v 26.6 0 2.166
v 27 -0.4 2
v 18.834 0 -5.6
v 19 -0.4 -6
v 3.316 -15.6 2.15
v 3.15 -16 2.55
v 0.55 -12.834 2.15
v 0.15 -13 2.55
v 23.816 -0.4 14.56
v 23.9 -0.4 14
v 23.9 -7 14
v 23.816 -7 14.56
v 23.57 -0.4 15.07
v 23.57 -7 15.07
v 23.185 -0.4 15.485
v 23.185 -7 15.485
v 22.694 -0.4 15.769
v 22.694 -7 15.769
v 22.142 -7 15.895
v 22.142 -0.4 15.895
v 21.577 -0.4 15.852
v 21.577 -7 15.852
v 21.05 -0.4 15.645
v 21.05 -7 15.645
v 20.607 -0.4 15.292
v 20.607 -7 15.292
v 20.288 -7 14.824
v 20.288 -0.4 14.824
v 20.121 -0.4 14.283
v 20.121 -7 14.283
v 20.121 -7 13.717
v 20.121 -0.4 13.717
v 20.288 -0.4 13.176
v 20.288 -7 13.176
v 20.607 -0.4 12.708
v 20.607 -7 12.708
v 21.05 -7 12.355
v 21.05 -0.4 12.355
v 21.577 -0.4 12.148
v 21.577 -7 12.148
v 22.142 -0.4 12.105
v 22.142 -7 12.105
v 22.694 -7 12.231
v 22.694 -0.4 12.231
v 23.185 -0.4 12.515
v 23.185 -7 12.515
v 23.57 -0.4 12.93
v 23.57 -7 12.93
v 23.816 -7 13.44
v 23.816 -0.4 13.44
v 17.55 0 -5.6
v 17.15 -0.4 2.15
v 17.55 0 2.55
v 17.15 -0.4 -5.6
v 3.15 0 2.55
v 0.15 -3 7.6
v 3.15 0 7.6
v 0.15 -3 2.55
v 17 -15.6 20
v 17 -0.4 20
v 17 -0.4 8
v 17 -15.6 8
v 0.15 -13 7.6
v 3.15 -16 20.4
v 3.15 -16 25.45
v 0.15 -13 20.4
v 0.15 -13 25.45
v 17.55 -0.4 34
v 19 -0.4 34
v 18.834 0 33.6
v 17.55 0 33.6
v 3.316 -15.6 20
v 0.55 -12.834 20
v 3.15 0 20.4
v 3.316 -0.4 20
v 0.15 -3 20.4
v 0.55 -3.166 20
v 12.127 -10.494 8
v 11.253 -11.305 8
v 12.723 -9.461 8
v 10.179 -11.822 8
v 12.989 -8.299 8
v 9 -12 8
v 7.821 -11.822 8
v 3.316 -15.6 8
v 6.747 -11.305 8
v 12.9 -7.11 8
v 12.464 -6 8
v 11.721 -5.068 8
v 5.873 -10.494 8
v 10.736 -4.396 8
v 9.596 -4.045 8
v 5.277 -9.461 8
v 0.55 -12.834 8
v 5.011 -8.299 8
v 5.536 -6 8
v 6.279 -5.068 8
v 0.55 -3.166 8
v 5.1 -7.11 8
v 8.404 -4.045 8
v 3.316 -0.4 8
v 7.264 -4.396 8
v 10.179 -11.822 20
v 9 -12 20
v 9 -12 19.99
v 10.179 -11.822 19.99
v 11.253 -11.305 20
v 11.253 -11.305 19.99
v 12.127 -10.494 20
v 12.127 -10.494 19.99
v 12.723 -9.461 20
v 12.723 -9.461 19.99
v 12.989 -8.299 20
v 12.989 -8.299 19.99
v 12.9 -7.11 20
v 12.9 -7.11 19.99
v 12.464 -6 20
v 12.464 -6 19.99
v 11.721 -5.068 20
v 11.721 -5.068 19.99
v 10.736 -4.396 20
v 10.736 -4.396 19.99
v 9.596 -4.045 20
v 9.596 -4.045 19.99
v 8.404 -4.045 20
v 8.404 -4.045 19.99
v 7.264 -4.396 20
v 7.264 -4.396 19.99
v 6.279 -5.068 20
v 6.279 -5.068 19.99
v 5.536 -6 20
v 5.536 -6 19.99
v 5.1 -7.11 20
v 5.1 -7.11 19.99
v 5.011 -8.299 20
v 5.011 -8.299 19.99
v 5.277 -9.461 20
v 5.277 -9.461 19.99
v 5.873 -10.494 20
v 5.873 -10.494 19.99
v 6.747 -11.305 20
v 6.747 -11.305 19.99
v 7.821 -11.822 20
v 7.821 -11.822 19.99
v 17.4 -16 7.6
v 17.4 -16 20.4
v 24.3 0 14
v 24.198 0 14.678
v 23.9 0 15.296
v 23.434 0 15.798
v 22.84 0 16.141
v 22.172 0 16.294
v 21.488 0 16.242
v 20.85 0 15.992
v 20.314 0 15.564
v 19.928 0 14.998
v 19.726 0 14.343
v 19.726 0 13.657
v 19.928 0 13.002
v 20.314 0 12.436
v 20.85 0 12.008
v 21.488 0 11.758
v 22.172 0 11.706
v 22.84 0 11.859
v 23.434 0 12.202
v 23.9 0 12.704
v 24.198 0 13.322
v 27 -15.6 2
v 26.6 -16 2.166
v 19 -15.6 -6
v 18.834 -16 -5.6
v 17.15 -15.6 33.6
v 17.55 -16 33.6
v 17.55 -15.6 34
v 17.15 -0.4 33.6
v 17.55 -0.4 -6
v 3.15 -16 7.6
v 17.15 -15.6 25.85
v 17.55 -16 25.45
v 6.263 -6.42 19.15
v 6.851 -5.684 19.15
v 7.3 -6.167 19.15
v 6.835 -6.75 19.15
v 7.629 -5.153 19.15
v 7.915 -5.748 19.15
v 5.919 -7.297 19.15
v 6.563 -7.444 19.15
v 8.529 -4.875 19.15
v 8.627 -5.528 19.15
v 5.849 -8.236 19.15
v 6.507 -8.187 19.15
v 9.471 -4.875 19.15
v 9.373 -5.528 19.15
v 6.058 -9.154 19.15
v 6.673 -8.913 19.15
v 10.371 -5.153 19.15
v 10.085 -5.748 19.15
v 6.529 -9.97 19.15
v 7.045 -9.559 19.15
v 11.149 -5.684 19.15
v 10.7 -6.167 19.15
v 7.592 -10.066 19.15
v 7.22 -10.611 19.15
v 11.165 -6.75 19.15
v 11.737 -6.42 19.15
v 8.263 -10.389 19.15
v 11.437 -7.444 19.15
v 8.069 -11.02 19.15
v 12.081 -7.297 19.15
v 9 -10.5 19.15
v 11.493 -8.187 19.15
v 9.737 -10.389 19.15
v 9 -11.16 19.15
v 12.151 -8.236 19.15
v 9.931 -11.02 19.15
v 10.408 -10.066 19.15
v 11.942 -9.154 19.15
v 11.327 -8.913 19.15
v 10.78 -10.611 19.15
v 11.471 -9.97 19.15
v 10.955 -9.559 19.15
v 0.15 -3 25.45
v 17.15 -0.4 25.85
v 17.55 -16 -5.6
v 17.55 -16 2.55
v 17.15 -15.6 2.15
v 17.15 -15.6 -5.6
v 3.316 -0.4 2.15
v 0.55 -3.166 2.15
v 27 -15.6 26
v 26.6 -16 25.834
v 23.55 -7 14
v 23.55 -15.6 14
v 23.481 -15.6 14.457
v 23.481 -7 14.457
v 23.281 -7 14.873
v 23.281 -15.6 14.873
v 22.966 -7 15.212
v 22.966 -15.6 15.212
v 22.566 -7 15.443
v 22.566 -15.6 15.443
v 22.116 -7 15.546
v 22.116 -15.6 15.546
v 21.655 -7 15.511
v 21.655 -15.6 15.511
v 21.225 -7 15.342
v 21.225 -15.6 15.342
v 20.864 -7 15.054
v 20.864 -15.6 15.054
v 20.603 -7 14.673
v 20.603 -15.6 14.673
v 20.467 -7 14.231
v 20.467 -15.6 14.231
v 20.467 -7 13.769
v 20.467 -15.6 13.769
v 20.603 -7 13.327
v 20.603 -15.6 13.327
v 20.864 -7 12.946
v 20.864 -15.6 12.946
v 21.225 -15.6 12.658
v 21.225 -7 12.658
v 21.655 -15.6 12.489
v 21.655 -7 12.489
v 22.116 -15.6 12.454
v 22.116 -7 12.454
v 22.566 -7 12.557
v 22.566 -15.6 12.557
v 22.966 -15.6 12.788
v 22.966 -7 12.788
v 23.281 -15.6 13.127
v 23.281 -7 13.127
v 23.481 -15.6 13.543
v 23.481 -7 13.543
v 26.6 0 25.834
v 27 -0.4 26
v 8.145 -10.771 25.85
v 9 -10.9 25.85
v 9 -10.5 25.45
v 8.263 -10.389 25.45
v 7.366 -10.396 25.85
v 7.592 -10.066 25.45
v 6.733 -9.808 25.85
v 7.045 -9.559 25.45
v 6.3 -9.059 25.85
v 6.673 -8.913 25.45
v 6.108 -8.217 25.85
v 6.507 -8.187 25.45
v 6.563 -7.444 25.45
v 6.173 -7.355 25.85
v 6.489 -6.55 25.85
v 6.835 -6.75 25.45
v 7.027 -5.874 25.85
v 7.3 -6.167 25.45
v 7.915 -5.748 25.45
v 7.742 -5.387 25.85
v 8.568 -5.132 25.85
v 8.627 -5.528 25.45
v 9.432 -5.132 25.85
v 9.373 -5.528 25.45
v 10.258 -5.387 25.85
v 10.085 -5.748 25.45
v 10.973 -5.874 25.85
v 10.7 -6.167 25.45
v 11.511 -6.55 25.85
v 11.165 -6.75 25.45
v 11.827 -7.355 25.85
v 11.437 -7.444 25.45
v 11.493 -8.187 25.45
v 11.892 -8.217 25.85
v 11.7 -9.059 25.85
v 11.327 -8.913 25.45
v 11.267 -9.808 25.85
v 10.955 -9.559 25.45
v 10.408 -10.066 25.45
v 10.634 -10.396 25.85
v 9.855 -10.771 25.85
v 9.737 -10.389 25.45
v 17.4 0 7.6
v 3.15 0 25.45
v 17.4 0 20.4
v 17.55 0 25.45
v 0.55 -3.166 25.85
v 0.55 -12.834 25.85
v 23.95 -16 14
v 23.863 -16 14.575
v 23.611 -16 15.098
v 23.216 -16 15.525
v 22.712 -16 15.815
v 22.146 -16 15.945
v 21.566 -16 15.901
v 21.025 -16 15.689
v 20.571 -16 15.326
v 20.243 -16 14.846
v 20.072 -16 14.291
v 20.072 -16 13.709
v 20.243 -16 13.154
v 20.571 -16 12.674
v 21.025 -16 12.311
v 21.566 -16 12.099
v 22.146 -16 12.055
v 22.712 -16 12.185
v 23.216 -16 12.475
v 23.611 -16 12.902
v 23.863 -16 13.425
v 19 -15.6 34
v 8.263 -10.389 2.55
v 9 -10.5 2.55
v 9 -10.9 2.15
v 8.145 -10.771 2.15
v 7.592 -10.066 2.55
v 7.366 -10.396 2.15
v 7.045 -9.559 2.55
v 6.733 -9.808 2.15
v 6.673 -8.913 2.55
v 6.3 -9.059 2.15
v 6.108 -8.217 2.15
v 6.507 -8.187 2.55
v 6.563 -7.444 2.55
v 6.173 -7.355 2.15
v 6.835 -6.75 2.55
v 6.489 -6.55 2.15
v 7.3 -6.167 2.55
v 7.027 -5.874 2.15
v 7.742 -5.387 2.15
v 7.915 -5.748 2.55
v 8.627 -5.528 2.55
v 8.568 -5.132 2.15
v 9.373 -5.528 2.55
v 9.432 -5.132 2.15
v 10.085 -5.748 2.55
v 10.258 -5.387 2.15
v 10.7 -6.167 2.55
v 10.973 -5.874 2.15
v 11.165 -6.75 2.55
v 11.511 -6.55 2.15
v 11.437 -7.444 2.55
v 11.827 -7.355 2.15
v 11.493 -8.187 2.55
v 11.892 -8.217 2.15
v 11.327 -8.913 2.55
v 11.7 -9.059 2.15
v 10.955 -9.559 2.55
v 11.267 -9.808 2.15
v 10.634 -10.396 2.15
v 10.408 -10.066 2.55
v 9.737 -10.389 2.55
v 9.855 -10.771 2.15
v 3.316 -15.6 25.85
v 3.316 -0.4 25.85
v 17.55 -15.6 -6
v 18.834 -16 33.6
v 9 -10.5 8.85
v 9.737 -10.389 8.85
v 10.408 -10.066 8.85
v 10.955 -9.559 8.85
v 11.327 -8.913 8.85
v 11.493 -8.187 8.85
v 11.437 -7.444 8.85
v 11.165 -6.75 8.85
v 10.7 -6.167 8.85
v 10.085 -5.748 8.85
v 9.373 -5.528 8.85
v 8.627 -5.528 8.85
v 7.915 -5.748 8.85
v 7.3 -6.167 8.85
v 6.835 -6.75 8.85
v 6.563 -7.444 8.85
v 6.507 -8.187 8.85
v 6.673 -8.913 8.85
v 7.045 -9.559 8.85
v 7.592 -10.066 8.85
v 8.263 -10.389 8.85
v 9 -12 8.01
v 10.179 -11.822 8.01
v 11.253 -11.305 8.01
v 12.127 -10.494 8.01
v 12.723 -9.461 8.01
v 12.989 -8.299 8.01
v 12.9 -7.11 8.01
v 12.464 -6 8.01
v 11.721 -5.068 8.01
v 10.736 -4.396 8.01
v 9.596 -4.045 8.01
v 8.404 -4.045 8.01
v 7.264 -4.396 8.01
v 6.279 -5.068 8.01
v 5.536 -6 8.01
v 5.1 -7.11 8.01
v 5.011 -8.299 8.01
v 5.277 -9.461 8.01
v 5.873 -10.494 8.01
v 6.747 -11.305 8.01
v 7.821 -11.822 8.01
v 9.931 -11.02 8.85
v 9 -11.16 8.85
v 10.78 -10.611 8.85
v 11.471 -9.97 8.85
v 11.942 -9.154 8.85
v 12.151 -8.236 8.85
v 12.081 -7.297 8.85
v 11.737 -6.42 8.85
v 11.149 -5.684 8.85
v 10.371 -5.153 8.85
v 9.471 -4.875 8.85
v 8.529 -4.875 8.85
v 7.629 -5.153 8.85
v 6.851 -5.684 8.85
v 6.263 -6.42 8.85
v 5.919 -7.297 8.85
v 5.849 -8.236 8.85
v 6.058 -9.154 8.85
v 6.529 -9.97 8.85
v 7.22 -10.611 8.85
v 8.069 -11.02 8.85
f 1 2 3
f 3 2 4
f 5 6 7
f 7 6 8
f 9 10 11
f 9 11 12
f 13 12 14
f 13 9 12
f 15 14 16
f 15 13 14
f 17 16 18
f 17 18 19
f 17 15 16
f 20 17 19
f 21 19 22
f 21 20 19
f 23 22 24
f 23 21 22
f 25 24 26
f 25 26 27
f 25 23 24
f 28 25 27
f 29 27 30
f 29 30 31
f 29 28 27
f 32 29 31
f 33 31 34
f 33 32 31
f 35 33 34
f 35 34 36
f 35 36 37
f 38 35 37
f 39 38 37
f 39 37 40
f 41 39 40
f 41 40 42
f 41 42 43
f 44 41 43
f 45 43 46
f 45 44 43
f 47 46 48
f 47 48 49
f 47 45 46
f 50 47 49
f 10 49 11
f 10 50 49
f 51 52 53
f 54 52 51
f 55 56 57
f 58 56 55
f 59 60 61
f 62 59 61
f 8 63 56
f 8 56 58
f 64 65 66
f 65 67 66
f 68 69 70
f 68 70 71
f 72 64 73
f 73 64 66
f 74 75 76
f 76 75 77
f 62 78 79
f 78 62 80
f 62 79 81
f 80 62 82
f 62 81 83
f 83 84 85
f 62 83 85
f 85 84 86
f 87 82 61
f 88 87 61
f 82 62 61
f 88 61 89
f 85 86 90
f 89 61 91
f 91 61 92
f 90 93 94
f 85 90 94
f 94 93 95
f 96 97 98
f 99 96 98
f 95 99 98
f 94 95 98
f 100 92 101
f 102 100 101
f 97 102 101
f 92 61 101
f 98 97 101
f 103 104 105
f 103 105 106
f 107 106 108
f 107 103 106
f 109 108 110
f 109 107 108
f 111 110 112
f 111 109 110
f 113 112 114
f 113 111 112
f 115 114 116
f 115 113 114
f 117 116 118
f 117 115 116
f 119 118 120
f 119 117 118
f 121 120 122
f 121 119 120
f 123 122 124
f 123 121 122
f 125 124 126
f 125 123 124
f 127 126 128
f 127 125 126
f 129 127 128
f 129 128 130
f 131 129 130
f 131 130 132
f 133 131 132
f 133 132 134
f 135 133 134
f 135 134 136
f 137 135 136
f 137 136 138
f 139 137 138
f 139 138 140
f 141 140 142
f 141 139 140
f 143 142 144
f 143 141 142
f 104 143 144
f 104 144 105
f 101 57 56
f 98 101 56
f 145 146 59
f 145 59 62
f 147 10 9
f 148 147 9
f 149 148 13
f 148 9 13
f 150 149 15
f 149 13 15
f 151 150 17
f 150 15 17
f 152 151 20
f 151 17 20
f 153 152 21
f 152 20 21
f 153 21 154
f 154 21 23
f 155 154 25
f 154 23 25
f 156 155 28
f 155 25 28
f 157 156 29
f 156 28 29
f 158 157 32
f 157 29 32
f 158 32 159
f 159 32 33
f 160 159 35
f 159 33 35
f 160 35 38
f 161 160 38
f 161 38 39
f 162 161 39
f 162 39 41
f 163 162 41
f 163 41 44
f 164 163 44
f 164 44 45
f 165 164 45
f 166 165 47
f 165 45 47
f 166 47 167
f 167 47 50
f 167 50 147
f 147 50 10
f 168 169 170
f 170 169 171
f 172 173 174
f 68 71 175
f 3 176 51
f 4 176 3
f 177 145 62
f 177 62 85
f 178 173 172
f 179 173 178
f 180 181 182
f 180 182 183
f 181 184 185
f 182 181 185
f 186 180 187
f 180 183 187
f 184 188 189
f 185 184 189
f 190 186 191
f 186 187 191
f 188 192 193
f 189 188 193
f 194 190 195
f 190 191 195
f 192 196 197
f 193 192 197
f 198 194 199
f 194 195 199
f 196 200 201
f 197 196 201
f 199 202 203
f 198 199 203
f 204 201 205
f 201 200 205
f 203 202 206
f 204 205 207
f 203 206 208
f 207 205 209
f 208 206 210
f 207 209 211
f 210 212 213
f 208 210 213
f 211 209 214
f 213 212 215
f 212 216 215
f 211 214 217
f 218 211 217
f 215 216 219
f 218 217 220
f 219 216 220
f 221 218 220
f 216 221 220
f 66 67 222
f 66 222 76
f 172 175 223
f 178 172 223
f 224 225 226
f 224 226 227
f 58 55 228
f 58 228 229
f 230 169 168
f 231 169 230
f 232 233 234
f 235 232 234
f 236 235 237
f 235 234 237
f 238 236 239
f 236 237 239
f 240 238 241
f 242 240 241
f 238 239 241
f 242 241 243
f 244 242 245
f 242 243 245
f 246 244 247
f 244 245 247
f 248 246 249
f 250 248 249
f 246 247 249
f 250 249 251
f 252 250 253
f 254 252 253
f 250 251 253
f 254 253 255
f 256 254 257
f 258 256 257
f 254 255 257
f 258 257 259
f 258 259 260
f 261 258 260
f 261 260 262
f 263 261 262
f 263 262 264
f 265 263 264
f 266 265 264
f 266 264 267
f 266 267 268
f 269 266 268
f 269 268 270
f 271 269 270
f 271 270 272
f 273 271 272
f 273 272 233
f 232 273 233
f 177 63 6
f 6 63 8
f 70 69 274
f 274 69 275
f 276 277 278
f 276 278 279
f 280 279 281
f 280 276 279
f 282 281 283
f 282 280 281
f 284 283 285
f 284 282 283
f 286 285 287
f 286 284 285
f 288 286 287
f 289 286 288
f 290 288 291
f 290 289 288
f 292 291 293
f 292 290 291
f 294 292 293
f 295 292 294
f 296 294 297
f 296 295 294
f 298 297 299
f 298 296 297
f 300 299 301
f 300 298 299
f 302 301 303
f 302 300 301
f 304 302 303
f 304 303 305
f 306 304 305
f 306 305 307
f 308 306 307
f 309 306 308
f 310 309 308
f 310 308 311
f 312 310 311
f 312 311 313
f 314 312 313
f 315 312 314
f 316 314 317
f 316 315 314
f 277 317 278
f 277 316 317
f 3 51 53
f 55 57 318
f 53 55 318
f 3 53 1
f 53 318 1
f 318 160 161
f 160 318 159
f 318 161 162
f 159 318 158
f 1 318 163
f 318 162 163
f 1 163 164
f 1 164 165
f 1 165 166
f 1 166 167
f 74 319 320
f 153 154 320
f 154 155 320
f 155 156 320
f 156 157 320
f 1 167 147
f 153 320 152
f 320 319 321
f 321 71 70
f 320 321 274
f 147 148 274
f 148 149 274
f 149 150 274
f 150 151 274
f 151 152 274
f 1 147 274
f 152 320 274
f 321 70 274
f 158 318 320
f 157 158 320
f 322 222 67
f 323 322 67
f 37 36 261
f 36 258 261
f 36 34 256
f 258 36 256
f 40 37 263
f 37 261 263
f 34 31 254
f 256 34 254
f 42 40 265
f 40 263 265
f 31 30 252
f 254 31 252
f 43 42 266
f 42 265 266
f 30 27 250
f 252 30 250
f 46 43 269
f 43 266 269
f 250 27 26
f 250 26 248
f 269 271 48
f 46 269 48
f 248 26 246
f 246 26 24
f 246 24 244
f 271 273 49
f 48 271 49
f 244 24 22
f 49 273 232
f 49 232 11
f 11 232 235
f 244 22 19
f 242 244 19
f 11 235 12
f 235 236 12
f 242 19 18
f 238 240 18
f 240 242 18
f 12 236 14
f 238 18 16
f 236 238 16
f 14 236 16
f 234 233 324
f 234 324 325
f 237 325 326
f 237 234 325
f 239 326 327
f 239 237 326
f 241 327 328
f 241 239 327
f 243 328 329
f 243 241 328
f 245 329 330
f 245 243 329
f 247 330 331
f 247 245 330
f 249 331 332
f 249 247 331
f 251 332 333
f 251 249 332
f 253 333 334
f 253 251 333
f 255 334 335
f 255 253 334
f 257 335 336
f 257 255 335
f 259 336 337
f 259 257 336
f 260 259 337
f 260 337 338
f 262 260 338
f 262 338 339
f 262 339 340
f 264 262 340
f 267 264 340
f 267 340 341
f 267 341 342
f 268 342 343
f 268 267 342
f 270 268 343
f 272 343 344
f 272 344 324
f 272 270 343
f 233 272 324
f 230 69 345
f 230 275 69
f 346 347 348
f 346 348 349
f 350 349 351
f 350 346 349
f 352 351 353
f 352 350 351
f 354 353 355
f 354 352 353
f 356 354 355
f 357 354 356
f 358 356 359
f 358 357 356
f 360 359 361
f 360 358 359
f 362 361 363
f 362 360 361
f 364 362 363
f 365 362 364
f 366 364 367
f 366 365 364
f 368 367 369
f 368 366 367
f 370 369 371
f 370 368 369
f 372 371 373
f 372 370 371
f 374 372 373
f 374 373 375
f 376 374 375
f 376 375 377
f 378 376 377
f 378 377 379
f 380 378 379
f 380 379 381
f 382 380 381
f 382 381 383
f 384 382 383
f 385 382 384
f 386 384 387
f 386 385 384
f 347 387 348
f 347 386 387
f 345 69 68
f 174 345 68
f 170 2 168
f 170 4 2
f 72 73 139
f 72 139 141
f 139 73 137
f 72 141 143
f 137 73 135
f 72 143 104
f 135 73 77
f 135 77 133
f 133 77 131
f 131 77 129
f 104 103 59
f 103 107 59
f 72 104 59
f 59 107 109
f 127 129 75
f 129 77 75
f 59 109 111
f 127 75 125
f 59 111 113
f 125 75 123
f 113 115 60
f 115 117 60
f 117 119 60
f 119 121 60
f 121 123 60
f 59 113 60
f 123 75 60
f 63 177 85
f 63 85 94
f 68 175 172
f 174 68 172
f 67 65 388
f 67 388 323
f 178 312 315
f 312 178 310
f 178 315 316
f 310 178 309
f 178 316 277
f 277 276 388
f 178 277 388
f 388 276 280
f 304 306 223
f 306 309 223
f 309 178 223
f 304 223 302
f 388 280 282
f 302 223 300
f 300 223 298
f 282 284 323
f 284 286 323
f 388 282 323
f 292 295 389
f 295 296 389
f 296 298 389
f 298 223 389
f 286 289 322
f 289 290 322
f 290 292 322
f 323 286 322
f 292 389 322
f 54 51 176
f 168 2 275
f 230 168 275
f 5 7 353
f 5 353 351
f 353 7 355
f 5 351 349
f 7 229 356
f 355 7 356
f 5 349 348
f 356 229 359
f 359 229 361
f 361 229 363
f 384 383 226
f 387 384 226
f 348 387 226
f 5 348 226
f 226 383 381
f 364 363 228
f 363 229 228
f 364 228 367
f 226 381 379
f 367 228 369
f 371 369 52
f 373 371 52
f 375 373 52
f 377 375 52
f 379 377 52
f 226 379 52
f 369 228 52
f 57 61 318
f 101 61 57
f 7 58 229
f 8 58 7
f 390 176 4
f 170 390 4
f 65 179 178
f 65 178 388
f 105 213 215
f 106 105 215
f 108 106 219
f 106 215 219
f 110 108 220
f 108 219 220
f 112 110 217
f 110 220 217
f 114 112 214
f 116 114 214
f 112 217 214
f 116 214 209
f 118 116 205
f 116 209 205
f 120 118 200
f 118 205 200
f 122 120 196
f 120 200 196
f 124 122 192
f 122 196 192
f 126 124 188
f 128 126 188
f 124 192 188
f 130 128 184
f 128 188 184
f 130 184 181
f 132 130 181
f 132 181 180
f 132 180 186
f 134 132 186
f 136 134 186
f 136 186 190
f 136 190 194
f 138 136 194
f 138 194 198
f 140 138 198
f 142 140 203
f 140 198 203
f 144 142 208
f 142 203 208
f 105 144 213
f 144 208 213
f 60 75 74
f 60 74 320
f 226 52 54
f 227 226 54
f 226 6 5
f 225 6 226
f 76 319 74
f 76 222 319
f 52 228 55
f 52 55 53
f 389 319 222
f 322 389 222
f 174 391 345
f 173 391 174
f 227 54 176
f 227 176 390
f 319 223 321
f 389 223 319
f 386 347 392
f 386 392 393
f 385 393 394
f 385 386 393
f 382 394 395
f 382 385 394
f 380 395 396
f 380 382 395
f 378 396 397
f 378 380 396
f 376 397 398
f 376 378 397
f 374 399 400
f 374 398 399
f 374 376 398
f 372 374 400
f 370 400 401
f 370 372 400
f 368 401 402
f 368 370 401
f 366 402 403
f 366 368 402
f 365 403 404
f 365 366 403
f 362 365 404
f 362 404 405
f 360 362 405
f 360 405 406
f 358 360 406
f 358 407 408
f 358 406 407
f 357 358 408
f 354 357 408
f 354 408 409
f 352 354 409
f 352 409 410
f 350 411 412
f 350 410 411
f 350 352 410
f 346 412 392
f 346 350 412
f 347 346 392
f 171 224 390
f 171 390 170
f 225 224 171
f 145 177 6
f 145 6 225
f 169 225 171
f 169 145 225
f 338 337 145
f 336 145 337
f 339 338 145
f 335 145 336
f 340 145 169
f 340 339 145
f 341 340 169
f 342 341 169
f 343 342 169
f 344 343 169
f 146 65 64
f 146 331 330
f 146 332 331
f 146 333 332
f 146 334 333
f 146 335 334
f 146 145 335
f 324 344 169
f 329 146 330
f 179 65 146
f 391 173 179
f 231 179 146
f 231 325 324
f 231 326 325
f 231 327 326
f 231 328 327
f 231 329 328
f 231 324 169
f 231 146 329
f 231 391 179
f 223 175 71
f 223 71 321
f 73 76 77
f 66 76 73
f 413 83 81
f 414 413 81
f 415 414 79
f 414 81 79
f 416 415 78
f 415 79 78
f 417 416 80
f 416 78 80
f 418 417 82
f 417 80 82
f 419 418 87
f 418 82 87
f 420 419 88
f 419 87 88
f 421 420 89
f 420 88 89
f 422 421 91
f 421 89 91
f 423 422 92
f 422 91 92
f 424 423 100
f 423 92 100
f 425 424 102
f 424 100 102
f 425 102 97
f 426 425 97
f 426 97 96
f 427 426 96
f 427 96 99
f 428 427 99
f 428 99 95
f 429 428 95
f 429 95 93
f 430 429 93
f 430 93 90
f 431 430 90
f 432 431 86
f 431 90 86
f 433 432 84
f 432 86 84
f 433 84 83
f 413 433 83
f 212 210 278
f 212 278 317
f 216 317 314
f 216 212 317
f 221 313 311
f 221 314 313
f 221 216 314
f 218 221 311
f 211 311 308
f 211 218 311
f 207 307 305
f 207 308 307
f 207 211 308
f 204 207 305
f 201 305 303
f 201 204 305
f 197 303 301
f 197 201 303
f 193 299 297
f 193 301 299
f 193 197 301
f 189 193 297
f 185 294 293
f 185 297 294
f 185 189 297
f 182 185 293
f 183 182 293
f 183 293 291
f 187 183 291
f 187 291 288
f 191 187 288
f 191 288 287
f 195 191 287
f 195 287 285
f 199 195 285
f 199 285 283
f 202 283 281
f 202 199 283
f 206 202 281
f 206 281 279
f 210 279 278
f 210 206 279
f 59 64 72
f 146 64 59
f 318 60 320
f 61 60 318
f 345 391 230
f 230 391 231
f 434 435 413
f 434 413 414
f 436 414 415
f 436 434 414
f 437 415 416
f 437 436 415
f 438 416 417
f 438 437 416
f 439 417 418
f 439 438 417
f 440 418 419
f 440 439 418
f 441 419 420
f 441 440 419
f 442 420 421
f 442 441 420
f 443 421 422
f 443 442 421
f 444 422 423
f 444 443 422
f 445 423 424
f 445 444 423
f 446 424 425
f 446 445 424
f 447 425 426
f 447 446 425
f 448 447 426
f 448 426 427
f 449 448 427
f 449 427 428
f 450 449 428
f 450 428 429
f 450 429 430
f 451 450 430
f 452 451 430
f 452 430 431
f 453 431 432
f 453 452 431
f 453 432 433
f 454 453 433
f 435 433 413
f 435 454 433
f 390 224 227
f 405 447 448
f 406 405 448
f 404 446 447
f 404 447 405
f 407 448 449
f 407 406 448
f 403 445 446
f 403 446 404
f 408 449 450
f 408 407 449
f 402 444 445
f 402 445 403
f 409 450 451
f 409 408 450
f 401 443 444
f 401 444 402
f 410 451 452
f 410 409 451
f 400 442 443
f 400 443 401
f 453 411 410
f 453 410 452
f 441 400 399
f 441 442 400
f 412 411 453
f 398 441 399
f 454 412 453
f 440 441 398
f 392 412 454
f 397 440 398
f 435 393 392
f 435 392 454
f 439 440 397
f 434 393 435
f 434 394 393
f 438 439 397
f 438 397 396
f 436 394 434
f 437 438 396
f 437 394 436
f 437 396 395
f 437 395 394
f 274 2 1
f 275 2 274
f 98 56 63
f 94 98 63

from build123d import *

# Parameters (mm, degrees)
PAD_DEPTH            = 16
SKETCH002_R          = 4
PAD001_DEPTH         = 0.85
SKETCH003_R          = 4
PAD002_DEPTH         = 0.85
SKETCH004_R          = 2.5
POCKET001_DEPTH      = 32.001
CHAMFER_SIZE         = 0.84
CHAMFER020021_SIZE   = 0.4
CHAMFER020022_SIZE   = 3
CHAMFER020023_SIZE   = 8
SKETCH005_R          = 1.55
POCKET_DEPTH         = 16.001
SKETCH006_R          = 1.9
POCKET002_DEPTH      = 7
CHAMFER020024_SIZE   = 0.4
BODY_PLACEMENT_ANGLE = 270


with BuildPart() as part:
    # Sketch → Pad (new body)
    with BuildSketch(Plane.YZ):
        Polygon((-8.85, 6), (8, 6), (8, -6), (-8.85, -6), (-8.85, -11.85), (8.15, -11.85), (8.15, -20), (18, -20), (18, 20), (8.15, 20), (8.15, 11.85), (-8.85, 11.85), align=None)
    extrude(amount=PAD_DEPTH)

    # Sketch002 (on DatumPlane) → Pad001 (join)
    with BuildSketch(Plane.XY.offset(-6)):
        with Locations((8, 0)):
            Circle(SKETCH002_R)
    extrude(amount=PAD001_DEPTH)

    # Sketch003 (on DatumPlane) → Pad002 (join)
    with BuildSketch(Plane.XY.offset(6)):
        with Locations((8, 0)):
            Circle(SKETCH003_R)
    extrude(amount=-PAD002_DEPTH)

    # Sketch004 (on DatumPlane) → Pocket001 (cut, through all)
    with BuildSketch(Plane.XY.offset(-12)):
        with Locations((8, 0)):
            Circle(SKETCH004_R)
    extrude(amount=POCKET001_DEPTH, mode=Mode.SUBTRACT)

    # Chamfer
    chamfer_edges = [part.edges().sort_by_distance(p)[0] for p in [
        (4, 0, -5.15),
        (4, 0, 5.15),
    ]]
    chamfer(chamfer_edges, length=CHAMFER_SIZE)

    # Chamfer020021
    chamfer020021_edges = [part.edges().sort_by_distance(p)[0] for p in [
        (5.5, 0, -11.85),
        (5.5, 0, 11.85),
    ]]
    chamfer(chamfer020021_edges, length=CHAMFER020021_SIZE)

    # Chamfer020022
    chamfer020022_edges = [part.edges().sort_by_distance(p)[0] for p in [
        (0, -8.85, 8.925),
        (16, -8.85, 8.925),
        (0, -8.85, -8.925),
        (16, -8.85, -8.925),
    ]]
    chamfer(chamfer020022_edges, length=CHAMFER020022_SIZE)

    # Chamfer020023
    chamfer020023_edges = [part.edges().sort_by_distance(p)[0] for p in [
        (8, 18, 20),
        (8, 18, -20),
    ]]
    chamfer(chamfer020023_edges, length=CHAMFER020023_SIZE)

    # Sketch005 (on DatumPlane) → Pocket (cut, through all)
    with BuildSketch(Plane.YZ.offset(16)):
        with Locations((13, 0)):
            Circle(SKETCH005_R)
    extrude(amount=-POCKET_DEPTH, mode=Mode.SUBTRACT)

    # Sketch006 (on DatumPlane) → Pocket002 (cut)
    with BuildSketch(Plane.YZ):
        with Locations((13, 0)):
            Circle(SKETCH006_R)
    extrude(amount=POCKET002_DEPTH, mode=Mode.SUBTRACT)

    # Chamfer020024
    chamfer020024_edges = [part.edges().sort_by_distance(p)[0] for p in [
        (16, 1.15, 11.85),
        (16, 8.15, 15.925),
        (16, 9.075, 20),
        (16, 14, 16),
        (16, 11.45, 0),
        (16, 14, -16),
        (16, 18, 0),
        (16, 8.15, -15.925),
        (16, 9.075, -20),
        (16, 1.15, -11.85),
        (16, 1.075, -6),
        (14.5, -7.35, -6),
        (14.5, -7.35, -11.85),
        (8, -8.85, -6),
        (8, -8.85, -11.85),
        (0, 8.15, -15.925),
        (0, 1.15, -11.85),
        (1.5, -7.35, -11.85),
        (1.5, -7.35, -6),
        (0, 1.075, -6),
        (0, 9.075, -20),
        (0, 14, -16),
        (0, 18, 0),
        (0, 11.1, 0),
        (0, 14, 16),
        (0, 9.075, 20),
        (0, 8.15, 15.925),
        (0, 1.15, 11.85),
        (0, 8, 0),
        (0, 1.075, 6),
        (1.5, -7.35, 6),
        (1.5, -7.35, 11.85),
        (8, -8.85, 11.85),
        (8, -8.85, 6),
        (14.5, -7.35, 6),
        (16, 1.075, 6),
        (16, 8, 0),
        (8, 8.15, -20),
        (8, 8.15, 20),
        (14.5, -7.35, 11.85),
    ]]
    chamfer(chamfer020024_edges, length=CHAMFER020024_SIZE)


with BuildPart() as part_1:
    # Body placement: moved
    add(part.part.moved(Location((9, 0, 14))).rotate(Axis((9, 0, 14), (0, 0, 1)), BODY_PLACEMENT_ANGLE))


solid = part_1.part
